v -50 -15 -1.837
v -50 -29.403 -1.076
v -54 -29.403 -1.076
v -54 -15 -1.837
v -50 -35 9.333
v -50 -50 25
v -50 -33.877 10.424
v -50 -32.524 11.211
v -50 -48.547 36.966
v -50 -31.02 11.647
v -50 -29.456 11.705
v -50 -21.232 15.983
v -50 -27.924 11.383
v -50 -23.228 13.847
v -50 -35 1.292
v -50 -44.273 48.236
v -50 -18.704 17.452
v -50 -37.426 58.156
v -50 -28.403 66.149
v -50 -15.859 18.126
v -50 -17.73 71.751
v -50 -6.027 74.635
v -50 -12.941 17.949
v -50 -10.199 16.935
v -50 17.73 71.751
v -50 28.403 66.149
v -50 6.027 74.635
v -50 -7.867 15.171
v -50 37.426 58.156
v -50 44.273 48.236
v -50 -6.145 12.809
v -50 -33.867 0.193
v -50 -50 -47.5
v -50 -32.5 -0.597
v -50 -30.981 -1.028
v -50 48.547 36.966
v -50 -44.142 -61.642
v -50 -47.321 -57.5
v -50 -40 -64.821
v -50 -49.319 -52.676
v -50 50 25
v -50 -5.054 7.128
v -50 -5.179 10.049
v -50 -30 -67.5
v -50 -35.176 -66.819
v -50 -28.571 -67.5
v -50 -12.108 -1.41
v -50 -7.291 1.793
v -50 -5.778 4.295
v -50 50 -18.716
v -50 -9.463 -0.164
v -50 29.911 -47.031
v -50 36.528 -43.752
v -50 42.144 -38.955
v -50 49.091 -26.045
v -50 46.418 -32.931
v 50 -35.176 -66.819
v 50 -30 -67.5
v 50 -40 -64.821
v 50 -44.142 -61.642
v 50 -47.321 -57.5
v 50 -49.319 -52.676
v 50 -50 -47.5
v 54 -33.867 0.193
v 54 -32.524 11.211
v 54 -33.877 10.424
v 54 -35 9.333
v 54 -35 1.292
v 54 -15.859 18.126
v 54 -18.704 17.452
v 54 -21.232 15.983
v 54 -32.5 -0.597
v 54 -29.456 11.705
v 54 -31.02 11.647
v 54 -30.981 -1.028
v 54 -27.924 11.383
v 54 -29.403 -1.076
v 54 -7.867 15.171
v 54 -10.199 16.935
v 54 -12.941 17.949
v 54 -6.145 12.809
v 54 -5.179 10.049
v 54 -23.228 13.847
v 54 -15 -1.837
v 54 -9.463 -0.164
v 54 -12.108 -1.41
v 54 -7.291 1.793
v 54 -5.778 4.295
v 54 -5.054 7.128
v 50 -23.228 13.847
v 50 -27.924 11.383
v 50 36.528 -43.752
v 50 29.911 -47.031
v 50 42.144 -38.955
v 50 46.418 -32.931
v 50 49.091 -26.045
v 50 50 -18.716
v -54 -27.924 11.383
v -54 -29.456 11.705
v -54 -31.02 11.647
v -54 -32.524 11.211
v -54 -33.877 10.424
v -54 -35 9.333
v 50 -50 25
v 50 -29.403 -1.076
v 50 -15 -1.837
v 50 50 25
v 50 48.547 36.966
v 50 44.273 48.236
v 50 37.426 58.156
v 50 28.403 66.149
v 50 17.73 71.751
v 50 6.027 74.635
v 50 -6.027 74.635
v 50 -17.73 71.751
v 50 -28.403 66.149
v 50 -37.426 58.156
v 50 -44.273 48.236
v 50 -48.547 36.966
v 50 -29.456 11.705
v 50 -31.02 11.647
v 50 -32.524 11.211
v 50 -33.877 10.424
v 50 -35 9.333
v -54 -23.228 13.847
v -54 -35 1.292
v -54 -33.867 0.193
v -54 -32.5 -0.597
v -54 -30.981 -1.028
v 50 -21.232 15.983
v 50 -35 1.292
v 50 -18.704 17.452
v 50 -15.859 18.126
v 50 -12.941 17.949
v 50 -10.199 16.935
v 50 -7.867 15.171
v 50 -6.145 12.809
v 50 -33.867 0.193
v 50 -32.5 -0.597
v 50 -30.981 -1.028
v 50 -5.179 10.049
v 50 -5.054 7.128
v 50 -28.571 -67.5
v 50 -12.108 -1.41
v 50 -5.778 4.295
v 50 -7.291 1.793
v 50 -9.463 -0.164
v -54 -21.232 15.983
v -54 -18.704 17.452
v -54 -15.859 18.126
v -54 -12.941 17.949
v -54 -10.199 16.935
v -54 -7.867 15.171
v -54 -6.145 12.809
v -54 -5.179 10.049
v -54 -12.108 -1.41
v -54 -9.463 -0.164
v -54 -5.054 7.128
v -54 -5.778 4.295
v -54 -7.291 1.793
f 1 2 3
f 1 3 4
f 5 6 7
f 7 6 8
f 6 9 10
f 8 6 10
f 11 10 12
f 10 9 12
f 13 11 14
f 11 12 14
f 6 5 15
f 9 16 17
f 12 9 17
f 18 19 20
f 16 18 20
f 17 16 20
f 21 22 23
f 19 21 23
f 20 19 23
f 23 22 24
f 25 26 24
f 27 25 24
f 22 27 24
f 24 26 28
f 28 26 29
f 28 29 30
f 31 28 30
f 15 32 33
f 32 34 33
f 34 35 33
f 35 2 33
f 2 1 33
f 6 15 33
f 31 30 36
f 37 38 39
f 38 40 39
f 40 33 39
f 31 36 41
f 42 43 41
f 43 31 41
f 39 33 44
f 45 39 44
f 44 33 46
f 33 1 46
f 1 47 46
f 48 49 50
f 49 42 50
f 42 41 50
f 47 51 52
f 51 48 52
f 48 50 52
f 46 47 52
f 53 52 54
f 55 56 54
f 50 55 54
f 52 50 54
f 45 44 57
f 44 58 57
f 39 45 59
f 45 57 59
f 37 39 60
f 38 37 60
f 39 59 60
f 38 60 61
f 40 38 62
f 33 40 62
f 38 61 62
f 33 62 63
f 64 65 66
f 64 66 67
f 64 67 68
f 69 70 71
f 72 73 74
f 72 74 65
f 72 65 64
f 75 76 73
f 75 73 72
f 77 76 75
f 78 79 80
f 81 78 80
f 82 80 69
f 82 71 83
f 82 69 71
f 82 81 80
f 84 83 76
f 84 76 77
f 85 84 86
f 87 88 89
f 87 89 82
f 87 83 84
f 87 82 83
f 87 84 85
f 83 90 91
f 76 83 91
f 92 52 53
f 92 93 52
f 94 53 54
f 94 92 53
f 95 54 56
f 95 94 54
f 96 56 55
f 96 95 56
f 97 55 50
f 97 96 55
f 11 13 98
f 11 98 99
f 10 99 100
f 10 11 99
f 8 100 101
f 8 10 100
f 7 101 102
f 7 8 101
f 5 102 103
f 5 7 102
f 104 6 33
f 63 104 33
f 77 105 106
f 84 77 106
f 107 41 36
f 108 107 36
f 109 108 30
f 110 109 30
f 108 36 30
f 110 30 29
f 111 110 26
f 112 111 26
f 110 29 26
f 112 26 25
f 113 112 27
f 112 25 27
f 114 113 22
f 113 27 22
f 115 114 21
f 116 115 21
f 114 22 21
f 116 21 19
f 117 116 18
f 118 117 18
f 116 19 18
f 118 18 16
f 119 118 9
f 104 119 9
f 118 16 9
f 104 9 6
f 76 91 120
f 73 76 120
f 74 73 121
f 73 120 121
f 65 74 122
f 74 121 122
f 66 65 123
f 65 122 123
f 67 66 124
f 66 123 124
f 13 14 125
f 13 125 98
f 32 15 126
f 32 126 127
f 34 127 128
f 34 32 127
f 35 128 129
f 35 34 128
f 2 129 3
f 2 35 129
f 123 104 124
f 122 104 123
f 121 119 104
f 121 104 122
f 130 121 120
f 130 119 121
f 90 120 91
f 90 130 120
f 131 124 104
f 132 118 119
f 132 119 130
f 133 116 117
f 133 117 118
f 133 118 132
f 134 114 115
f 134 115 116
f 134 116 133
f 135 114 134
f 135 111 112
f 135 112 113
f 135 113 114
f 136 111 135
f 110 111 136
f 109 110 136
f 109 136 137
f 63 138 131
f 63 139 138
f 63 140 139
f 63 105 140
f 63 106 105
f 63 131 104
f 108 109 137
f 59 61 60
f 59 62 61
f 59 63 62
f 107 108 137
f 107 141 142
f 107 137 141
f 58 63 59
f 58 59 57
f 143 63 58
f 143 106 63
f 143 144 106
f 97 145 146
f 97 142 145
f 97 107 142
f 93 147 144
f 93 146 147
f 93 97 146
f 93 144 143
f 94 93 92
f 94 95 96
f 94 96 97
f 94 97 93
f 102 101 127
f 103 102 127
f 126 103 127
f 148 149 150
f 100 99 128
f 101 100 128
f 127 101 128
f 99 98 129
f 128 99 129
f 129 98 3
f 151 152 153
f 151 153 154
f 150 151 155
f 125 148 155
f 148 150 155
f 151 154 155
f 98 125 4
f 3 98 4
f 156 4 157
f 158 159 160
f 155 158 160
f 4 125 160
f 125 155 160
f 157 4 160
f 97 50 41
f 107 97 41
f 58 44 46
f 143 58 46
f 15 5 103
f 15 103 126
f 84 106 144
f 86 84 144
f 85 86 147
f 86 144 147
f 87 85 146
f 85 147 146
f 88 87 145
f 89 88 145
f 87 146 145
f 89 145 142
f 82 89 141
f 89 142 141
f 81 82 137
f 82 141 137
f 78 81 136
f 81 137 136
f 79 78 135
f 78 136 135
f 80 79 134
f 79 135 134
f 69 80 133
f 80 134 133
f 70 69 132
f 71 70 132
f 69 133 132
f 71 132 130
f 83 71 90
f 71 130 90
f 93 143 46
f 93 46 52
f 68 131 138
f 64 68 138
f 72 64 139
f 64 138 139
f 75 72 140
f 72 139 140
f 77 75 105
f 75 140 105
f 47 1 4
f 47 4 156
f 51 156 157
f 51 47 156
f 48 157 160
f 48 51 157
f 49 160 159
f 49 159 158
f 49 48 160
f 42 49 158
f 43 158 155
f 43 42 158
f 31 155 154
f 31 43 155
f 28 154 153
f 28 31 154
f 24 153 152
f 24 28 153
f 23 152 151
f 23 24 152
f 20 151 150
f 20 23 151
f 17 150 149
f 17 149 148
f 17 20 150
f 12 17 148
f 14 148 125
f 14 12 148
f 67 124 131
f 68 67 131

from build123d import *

# Parameters (mm, degrees)
BOSS_EXTRUDE1_DEPTH      = 50
BOSS_EXTRUDE1_DEPTH_BACK = 50
FILLET1_R                = 30
BOSS_EXTRUDE2_DEPTH      = 4
FILLET4_R                = 20


with BuildPart() as part:
    # Sketch1 → Boss-Extrude1 (new, two sides: drawn at the far end of the back side and taken through both)
    with BuildSketch(Plane(origin=(0, 0, 0), x_dir=(0, 0, -1), z_dir=(1, 0, 0)).offset(-BOSS_EXTRUDE1_DEPTH_BACK)):
        with BuildLine():
            Line((67.5, -28.571428571), (40, 50))
            Line((40, 50), (-25.000000097, 50))
            ThreePointArc((-25.000000097, 50), (-75, -6.7e-08), (-24.999999963, -50))
            Line((-24.999999963, -50), (67.5, -50))
            Line((67.5, -50), (67.5, -28.571428571))
        make_face()
    extrude(amount=BOSS_EXTRUDE1_DEPTH + BOSS_EXTRUDE1_DEPTH_BACK)

    # Fillet1
    fillet1_edges = [part.edges().sort_by_distance(p)[0] for p in [
        (0, 50, -40),
    ]]
    fillet(fillet1_edges, radius=FILLET1_R)

    # Sketch6 → Boss-Extrude2 (add)
    with BuildSketch(Plane(origin=(50, 0, 0), x_dir=(0, 0, -1), z_dir=(1, 0, 0))):
        with BuildLine():
            ThreePointArc((-1.291867628, -35), (0.59665296, -32.49963092), (1.075777558, -29.403052943))
            Line((1.075777558, -29.403052943), (1.837060492, -15))
            ThreePointArc((1.837060492, -15), (-12.80850841, -6.144567228), (-13.846677423, -23.22770462))
            Line((-13.846677423, -23.22770462), (-11.38303259, -27.92393056))
            ThreePointArc((-11.38303259, -27.92393056), (-11.474733065, -31.785574712), (-9.332730592, -35))
            Line((-9.332730592, -35), (-1.291867628, -35))
        make_face()
    boss_extrude2 = extrude(amount=BOSS_EXTRUDE2_DEPTH)

    # Mirror2: Boss-Extrude2 across plane
    add(boss_extrude2.mirror(Plane(origin=(0, 0, 0), x_dir=(0, 0, 1), z_dir=(1, 0, 0))))

    # Fillet4
    fillet4_edges = [part.edges().sort_by_distance(p)[0] for p in [
        (0, -50, -67.5),
    ]]
    fillet(fillet4_edges, radius=FILLET4_R)


solid = part.part
